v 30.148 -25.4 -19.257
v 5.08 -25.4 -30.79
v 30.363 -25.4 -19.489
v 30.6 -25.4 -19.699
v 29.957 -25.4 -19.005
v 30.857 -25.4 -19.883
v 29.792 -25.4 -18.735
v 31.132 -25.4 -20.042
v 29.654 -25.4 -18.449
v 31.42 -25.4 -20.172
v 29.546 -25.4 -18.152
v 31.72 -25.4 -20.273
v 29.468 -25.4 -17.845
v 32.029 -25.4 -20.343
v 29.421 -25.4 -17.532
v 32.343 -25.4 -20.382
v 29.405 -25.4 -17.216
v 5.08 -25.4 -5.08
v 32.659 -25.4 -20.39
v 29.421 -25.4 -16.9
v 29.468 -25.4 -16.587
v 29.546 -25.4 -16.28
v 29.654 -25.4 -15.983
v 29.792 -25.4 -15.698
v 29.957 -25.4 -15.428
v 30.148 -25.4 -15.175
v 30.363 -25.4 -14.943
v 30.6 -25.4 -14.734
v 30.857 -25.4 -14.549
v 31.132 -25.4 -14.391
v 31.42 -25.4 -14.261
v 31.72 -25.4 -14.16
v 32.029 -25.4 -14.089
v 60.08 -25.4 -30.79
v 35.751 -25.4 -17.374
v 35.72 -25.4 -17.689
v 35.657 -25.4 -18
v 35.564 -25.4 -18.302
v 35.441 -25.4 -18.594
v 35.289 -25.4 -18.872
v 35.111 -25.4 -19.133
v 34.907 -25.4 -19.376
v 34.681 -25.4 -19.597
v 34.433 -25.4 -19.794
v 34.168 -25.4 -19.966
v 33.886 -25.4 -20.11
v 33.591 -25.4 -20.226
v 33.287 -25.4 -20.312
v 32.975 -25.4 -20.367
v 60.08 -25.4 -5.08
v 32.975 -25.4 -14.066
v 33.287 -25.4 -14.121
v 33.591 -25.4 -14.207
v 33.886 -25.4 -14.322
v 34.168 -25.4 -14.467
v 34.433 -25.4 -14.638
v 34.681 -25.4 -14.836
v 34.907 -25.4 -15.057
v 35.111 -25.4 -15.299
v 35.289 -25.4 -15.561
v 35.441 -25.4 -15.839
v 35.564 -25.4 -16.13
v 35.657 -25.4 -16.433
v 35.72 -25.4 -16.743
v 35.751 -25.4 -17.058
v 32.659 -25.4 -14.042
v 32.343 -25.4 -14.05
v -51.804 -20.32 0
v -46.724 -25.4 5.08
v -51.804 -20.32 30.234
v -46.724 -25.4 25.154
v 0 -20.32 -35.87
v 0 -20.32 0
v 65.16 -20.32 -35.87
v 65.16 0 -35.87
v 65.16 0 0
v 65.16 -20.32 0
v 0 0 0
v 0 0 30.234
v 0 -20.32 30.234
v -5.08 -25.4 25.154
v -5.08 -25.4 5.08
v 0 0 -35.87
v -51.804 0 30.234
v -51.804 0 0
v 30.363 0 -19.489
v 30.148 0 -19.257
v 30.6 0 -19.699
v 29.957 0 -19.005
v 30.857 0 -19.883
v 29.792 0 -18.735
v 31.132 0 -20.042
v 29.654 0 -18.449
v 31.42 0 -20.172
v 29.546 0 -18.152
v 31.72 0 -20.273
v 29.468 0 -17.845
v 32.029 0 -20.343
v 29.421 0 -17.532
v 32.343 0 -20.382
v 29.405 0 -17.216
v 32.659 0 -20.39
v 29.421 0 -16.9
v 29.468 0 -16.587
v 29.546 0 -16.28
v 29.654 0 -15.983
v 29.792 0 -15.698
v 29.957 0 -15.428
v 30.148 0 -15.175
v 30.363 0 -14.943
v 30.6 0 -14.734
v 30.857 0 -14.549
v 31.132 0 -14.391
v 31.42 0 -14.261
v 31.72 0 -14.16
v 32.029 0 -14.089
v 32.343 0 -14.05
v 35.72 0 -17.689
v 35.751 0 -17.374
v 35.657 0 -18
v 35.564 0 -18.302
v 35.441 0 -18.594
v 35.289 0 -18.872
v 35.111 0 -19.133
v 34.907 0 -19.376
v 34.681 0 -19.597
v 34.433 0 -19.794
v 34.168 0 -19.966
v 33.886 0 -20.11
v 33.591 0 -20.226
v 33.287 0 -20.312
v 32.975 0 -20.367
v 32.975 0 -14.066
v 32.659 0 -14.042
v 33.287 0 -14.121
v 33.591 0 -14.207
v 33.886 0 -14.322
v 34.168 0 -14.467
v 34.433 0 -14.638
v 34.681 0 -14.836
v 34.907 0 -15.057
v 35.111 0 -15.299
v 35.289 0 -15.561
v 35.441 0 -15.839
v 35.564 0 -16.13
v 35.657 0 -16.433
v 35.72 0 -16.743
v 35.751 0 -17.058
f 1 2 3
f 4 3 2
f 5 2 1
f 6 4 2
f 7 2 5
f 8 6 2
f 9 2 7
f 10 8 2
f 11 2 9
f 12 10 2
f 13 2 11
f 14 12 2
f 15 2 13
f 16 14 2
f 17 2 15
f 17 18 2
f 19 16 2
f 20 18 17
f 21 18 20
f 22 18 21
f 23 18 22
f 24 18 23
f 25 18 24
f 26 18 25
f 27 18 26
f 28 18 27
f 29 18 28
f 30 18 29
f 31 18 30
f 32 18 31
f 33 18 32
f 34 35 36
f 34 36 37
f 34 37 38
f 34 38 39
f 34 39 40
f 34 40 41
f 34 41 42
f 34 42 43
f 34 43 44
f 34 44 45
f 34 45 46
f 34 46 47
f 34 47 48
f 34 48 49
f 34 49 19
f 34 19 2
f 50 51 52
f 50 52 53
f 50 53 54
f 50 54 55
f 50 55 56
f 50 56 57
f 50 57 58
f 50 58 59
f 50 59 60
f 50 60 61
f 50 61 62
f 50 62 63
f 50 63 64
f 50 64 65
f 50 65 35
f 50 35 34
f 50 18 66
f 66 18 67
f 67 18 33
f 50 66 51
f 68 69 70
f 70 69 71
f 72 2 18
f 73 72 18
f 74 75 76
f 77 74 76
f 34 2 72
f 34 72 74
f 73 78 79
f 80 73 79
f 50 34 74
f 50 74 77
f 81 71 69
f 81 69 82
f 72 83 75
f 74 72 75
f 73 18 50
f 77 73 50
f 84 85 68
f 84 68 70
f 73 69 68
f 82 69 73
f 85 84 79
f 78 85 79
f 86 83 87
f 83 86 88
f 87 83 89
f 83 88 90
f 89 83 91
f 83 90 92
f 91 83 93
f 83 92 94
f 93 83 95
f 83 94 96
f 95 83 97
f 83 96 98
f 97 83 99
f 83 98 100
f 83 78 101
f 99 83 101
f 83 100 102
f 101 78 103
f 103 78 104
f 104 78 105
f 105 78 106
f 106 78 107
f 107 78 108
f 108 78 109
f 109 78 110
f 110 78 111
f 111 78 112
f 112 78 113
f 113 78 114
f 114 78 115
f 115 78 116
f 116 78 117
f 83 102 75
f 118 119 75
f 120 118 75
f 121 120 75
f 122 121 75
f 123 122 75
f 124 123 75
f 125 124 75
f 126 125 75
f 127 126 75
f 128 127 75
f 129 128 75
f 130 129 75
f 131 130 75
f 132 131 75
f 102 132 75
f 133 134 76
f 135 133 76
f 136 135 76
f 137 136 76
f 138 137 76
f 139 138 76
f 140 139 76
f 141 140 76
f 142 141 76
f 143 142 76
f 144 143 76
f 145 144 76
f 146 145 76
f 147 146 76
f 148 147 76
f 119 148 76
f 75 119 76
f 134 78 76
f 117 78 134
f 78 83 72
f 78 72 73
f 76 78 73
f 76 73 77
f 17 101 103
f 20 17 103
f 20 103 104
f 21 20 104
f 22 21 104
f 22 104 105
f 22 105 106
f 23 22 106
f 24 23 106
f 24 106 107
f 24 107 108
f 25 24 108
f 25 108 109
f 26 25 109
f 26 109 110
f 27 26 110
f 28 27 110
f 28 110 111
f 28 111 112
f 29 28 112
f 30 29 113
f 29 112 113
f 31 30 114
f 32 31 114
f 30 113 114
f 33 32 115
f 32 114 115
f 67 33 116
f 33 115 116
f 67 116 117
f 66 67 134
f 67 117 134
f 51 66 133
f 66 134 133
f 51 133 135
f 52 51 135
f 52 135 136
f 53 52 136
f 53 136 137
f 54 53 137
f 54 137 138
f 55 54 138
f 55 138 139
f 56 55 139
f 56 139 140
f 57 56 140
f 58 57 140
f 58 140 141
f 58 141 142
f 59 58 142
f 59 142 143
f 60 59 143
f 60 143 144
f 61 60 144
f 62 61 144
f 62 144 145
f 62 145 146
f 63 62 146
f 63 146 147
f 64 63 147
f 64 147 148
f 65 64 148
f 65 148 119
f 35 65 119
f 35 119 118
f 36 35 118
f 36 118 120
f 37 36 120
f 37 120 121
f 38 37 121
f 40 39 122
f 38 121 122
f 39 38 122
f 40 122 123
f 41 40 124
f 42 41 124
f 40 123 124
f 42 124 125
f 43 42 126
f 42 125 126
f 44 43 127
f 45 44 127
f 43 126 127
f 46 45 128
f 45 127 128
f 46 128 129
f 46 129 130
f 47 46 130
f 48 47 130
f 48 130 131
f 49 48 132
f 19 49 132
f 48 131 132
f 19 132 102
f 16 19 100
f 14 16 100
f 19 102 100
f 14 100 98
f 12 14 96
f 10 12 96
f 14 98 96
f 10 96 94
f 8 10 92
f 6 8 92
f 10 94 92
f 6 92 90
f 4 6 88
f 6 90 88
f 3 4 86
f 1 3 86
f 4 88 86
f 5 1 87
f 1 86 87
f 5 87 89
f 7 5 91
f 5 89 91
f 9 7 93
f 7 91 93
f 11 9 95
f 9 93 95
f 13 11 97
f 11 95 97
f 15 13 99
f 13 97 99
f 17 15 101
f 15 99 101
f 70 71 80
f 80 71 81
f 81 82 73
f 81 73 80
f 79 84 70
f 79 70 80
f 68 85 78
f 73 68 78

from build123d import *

# Parameters (mm, degrees)
F0_W     = 65.1600956917
F0_H     = 35.869628191
F1_DEPTH = 25.4
F0_W_2   = 51.8044084311
F0_H_2   = 30.234336853
F2_SIZE  = 5.08
F3_SIZE  = 5.08
F5_D     = 6.35


with BuildPart() as f1:
    # F0 (on Front) → F1 (new body)
    with BuildSketch(Plane.XZ):
        with Locations((32.5800478458, -17.9348140955)):
            Rectangle(F0_W, F0_H)
    extrude(amount=F1_DEPTH)

    # F2
    f2_edges = [f1.edges().sort_by_distance(p)[0] for p in [
        (32.580048, -25.4, 0),
        (0, -25.4, -17.934814),
        (32.580048, -25.4, -35.869628),
        (65.160096, -25.4, -17.934814),
    ]]
    chamfer(f2_edges, length=F2_SIZE)

    # F5 (through all)
    with Locations(Plane.XZ.offset(25.4)):
        with Locations((32.5800478458, -17.2162055969)):
            Hole(F5_D / 2)


with BuildPart() as f1b:
    # F0 (on Front) → F1, piece 2 (new body)
    with BuildSketch(Plane.XZ):
        with Locations((-25.9022042155, 15.1171684265)):
            Rectangle(F0_W_2, F0_H_2)
    extrude(amount=F1_DEPTH)

    # F3
    f3_edges = [f1b.edges().sort_by_distance(p)[0] for p in [
        (-25.902204, -25.4, 30.234337),
        (-25.902204, -25.4, 0),
        (0, -25.4, 15.117168),
        (-51.804408, -25.4, 15.117168),
    ]]
    chamfer(f3_edges, length=F3_SIZE)


solid = Compound([f1.part, f1b.part])
